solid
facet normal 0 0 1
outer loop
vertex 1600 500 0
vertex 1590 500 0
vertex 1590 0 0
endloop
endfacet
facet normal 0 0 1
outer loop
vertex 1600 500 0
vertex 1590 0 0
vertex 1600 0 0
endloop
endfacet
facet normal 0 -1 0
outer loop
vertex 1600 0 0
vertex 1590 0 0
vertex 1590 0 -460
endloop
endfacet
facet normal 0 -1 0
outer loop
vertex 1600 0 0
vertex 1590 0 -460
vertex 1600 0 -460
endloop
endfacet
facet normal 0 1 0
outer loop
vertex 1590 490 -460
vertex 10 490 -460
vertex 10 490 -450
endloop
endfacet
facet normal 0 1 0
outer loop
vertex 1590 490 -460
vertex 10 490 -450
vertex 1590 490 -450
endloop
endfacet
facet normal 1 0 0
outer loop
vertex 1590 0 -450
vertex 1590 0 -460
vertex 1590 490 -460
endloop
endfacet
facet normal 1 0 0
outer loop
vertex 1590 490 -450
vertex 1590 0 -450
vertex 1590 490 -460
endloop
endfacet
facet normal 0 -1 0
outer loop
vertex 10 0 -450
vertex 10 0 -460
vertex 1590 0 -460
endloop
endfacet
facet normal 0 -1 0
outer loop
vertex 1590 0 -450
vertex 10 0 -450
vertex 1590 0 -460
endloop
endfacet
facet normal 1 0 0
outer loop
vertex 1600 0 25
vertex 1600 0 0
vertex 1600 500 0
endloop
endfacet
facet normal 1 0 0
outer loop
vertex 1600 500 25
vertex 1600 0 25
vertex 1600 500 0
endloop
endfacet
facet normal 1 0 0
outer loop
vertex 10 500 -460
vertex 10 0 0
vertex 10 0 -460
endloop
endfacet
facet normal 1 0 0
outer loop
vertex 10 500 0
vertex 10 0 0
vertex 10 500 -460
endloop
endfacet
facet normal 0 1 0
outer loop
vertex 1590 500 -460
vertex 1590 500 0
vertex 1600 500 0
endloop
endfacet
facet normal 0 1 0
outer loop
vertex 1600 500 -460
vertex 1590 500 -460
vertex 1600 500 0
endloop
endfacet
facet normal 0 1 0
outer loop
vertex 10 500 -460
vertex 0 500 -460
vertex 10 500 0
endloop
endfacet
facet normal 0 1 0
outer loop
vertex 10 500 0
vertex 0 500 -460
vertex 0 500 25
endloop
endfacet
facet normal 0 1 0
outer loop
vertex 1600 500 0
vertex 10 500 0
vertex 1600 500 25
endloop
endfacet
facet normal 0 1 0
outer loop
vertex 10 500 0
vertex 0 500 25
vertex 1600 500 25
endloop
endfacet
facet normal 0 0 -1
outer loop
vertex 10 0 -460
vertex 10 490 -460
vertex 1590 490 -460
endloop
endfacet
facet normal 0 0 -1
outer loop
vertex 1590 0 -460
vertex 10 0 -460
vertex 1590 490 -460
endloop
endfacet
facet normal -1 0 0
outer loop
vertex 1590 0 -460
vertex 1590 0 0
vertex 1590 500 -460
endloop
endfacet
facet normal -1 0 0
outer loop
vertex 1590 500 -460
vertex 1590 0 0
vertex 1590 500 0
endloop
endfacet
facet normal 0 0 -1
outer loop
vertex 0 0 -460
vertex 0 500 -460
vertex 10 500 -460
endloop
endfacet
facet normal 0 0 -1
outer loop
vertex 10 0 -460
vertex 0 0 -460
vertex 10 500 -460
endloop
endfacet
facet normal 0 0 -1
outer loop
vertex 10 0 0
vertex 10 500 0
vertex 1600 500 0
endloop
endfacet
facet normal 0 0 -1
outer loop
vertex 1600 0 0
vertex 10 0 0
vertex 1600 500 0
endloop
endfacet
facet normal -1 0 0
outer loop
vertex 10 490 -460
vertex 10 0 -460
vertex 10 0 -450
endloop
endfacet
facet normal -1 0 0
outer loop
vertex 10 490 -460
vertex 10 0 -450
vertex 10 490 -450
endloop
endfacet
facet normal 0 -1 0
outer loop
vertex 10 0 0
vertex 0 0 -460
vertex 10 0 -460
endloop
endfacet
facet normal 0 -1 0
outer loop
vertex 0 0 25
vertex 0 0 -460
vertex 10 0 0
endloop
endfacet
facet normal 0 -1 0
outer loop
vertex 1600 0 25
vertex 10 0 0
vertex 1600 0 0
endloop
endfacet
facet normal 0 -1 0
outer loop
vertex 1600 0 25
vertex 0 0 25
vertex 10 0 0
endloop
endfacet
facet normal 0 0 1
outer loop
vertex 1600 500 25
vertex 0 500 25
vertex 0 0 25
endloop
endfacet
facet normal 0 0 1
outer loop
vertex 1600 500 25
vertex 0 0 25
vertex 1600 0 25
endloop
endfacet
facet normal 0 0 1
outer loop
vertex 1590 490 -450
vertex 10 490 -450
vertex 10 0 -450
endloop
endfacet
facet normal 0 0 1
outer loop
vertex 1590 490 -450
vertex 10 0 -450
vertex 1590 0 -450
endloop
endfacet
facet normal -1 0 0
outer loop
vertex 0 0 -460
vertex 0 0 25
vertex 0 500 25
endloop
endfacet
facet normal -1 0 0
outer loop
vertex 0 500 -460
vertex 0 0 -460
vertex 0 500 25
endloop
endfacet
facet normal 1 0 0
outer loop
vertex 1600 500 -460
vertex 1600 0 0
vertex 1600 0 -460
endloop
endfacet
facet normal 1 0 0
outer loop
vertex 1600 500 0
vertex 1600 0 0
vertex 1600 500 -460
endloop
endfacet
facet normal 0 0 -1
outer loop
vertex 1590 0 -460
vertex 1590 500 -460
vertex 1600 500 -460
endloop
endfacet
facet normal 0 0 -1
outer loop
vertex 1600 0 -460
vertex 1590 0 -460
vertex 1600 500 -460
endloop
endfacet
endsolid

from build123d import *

# Parameters (mm, degrees)
F0_W     = 1600
F0_H     = 500
F1_DEPTH = 25
F3_W     = 1580
F3_H     = 490
F4_DEPTH = 10
F5_W     = 10
F5_H     = 500
F6_DEPTH = 460
F7_W     = 10
F7_H     = 500
F8_DEPTH = 460


with BuildPart() as f1:
    # F0 (on Top) → F1 (new body)
    with BuildSketch(Plane.XY):
        with Locations((800, 250)):
            Rectangle(F0_W, F0_H)
    extrude(amount=F1_DEPTH)

    # F5 (on face) → F6 (join, through all)
    with BuildSketch(Plane.XY):
        with Locations((5, 250)):
            Rectangle(F5_W, F5_H)
    extrude(amount=-F6_DEPTH)


with BuildPart() as f4:
    # F3 (on offset) → F4 (new body)
    with BuildSketch(Plane.XY.offset(-460)):
        with Locations((800, 245)):
            Rectangle(F3_W, F3_H)
    extrude(amount=F4_DEPTH)


with BuildPart() as f8:
    # F7 (on face) → F8 (new body, through all)
    with BuildSketch(Plane.XY):
        with Locations((1595, 250)):
            Rectangle(F7_W, F7_H)
    extrude(amount=-F8_DEPTH)


solid = Compound([f1.part, f4.part, f8.part])
